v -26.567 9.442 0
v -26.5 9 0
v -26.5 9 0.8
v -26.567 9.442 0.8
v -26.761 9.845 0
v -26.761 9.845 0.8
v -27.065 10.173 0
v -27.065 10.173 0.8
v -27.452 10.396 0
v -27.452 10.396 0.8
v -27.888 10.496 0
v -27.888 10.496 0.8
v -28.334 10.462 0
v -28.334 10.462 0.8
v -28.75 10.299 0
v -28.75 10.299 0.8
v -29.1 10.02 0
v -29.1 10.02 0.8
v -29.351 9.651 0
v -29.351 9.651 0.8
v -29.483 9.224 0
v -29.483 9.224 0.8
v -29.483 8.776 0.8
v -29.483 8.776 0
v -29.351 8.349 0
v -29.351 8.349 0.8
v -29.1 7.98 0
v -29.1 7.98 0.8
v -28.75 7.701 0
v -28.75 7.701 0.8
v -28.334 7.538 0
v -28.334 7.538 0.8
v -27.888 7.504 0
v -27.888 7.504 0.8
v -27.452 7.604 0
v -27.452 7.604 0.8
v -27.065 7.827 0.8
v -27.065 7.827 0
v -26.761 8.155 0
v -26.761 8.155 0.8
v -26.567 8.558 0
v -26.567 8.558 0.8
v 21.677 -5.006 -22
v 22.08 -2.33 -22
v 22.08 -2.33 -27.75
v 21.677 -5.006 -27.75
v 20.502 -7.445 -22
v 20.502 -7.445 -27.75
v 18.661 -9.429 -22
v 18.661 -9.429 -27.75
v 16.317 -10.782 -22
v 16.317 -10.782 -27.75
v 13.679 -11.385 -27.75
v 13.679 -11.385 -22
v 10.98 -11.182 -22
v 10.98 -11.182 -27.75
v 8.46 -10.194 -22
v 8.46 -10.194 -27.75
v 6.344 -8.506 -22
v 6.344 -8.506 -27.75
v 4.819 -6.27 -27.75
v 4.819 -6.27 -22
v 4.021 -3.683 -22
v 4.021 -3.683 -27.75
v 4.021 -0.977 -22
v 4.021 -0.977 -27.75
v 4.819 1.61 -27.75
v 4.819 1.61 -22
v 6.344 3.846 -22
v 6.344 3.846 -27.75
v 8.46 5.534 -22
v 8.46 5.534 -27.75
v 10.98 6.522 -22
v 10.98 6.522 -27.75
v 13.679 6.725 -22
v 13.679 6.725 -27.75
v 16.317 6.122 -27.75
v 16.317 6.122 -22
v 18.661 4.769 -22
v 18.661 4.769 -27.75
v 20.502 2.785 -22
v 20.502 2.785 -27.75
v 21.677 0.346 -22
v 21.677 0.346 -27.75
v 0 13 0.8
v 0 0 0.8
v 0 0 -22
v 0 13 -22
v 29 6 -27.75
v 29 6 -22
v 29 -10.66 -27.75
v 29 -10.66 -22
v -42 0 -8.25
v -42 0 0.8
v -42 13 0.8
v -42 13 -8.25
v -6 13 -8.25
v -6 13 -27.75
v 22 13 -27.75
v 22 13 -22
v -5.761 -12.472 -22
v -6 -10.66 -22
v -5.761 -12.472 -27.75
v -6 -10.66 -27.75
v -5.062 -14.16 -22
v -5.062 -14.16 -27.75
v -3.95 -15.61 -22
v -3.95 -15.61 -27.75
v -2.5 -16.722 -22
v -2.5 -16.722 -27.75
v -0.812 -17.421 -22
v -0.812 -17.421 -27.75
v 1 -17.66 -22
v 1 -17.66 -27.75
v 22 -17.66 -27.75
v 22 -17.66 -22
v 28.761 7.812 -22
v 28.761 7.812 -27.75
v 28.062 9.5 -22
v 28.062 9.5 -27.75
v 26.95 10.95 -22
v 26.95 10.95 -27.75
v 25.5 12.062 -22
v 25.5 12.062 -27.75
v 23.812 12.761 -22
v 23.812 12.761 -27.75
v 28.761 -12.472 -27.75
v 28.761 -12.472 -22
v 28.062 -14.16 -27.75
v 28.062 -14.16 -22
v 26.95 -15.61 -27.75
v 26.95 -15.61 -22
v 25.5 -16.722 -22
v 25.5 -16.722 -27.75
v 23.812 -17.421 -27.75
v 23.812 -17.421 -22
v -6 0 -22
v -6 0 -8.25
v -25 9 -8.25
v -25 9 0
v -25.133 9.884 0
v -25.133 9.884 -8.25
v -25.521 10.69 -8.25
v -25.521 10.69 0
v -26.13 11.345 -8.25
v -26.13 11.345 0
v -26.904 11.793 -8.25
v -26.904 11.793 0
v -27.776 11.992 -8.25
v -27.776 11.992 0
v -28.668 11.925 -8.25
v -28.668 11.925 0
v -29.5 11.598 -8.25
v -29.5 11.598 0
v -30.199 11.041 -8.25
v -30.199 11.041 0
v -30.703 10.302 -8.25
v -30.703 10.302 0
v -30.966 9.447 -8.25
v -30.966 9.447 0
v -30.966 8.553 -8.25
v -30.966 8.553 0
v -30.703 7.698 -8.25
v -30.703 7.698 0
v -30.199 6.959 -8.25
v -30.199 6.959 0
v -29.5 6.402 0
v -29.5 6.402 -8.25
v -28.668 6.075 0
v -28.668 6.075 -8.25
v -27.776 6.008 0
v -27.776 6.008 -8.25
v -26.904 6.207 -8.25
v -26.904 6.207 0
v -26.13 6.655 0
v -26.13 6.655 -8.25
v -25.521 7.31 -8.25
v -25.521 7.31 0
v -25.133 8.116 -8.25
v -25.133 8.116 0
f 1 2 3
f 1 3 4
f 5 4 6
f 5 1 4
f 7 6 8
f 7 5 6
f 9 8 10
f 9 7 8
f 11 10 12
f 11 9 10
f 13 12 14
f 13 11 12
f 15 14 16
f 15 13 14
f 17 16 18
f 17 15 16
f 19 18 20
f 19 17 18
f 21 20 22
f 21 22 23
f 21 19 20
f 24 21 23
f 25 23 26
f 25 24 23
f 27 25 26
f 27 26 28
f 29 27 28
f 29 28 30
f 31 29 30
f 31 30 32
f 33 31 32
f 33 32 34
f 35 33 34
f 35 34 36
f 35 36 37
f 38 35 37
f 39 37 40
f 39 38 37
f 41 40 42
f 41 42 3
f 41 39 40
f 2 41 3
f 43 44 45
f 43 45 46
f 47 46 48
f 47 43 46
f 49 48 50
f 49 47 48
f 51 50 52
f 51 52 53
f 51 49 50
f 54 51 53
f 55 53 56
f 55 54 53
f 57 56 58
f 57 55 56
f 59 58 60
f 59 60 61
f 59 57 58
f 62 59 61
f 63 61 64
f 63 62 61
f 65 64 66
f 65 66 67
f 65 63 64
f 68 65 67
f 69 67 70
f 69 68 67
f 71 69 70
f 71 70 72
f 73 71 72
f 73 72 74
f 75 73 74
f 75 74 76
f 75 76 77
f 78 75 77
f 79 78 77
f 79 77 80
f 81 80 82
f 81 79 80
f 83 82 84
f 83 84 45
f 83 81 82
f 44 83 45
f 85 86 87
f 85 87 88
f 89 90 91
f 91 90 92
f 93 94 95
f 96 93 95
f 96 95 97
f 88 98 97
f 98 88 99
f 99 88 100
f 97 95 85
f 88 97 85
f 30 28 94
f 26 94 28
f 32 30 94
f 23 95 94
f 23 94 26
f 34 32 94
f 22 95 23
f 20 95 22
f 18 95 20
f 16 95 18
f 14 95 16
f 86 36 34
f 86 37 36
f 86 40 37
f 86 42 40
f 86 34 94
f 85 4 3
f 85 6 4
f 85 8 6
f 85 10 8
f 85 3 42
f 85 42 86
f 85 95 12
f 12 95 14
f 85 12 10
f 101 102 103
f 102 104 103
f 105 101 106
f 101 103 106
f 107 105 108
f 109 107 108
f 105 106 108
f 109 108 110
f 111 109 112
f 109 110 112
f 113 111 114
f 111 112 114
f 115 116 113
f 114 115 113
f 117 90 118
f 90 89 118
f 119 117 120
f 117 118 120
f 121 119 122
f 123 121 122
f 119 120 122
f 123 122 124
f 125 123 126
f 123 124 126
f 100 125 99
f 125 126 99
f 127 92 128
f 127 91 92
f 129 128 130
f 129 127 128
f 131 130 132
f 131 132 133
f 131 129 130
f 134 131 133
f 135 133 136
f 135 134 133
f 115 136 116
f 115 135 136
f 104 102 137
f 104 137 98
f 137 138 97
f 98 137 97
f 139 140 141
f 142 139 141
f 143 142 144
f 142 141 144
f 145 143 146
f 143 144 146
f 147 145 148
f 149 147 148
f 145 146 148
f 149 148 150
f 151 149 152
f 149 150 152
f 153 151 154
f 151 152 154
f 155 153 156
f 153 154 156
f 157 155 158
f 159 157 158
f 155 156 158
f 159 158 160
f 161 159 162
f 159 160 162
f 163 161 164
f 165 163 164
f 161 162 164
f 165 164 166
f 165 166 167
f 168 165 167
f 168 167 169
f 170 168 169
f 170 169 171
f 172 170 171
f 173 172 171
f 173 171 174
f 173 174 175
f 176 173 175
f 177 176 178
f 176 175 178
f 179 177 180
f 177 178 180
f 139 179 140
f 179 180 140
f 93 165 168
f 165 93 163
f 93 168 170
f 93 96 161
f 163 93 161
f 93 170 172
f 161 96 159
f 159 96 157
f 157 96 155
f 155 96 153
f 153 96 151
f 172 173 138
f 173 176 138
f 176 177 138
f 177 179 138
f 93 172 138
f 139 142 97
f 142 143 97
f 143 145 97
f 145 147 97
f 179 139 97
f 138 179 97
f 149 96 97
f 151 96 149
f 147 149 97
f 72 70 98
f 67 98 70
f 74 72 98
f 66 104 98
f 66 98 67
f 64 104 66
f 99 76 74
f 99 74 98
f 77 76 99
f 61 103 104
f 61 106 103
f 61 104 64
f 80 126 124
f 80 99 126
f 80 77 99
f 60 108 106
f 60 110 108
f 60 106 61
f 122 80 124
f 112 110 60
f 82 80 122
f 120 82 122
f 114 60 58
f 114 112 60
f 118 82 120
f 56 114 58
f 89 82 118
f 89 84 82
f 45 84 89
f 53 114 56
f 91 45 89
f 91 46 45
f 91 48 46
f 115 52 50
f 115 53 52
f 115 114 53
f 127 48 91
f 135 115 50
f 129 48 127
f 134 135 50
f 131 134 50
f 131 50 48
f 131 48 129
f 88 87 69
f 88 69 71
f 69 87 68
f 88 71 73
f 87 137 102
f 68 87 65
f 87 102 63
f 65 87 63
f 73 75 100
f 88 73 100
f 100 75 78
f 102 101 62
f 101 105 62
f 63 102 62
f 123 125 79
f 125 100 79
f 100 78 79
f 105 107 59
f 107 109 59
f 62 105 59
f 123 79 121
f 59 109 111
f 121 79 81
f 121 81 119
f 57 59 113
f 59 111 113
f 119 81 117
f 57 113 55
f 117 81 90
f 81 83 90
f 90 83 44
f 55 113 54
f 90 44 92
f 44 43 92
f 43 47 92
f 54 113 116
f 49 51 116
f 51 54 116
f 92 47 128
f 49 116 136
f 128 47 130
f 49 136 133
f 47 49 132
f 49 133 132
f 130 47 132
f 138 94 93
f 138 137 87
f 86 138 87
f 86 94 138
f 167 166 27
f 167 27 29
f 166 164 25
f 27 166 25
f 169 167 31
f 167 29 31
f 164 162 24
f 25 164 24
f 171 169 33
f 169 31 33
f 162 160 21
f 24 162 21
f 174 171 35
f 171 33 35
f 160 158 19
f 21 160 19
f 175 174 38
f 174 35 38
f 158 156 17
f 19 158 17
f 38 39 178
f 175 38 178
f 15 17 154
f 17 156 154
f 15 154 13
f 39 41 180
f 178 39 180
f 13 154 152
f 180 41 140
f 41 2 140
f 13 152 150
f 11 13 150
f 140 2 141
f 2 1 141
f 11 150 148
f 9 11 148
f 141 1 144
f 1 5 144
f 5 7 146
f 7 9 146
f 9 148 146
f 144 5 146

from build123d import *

# Parameters (mm, degrees)
F0_W     = 6
F0_H     = 13
F0_W_2   = 36
F0_R     = 3
F0_R_2   = 1.5
F1_DEPTH = 0.8
F2_DEPTH = 22
F3_DEPTH = 8.25
F4_R     = 13
F4_W     = 6
F4_H     = 13
F4_R_2   = 9.08
F5_DEPTH = 5.75
F6_R     = 7


# Not quite as in the source:
# - a feature names something its author has since deleted; it is built from what else it names


with BuildPart() as f1:
    # F0 (on Top) → F1 (new body)
    with BuildSketch(Plane.XY):
        with Locations((-3, 6.5)):
            Rectangle(F0_W, F0_H)
        with Locations((-24, 6.5)):
            Rectangle(F0_W_2, F0_H)
        with Locations((-28, 9)):
            Circle(F0_R, mode=Mode.SUBTRACT)
        with Locations((-28, 9)):
            Circle(F0_R)
        with Locations((-28, 9)):
            Circle(F0_R_2, mode=Mode.SUBTRACT)
    extrude(amount=F1_DEPTH)

    # F0 (on Top) → F2 (join)
    with BuildSketch(Plane.XY):
        with Locations((-3, 6.5)):
            Rectangle(F0_W, F0_H)
    extrude(amount=-F2_DEPTH)

    # F0 (on Top) → F3 (join)
    with BuildSketch(Plane.XY):
        with Locations((-24, 6.5)):
            Rectangle(F0_W_2, F0_H)
        with Locations((-28, 9)):
            Circle(F0_R, mode=Mode.SUBTRACT)
    extrude(amount=-F3_DEPTH)

    # F4 (on face) → F5 (join)
    with BuildSketch(Plane(origin=(0, 0, -22), x_dir=(1, 0, 0), z_dir=(0, 0, -1))):
        Polygon((29, 17.66), (-6, 17.66), (-6, 0), (0, 0), (0, -13), (17.6005885005, -13), (29, -13), align=None)
        with Locations((13, 2.33)):
            Circle(F4_R, mode=Mode.SUBTRACT)
        with Locations((-3, -6.5)):
            Rectangle(F4_W, F4_H)
        with Locations((13, 2.33)):
            Circle(F4_R)
        with Locations((13, 2.33)):
            Circle(F4_R_2, mode=Mode.SUBTRACT)
    extrude(amount=F5_DEPTH)

    # F6
    f6_edges = [f1.edges().sort_by_distance(p)[0] for p in [
        (-6, -17.66, -24.875),
        (29, -17.66, -24.875),
        (29, 13, -24.875),
    ]]
    fillet(f6_edges, radius=F6_R)


solid = f1.part
